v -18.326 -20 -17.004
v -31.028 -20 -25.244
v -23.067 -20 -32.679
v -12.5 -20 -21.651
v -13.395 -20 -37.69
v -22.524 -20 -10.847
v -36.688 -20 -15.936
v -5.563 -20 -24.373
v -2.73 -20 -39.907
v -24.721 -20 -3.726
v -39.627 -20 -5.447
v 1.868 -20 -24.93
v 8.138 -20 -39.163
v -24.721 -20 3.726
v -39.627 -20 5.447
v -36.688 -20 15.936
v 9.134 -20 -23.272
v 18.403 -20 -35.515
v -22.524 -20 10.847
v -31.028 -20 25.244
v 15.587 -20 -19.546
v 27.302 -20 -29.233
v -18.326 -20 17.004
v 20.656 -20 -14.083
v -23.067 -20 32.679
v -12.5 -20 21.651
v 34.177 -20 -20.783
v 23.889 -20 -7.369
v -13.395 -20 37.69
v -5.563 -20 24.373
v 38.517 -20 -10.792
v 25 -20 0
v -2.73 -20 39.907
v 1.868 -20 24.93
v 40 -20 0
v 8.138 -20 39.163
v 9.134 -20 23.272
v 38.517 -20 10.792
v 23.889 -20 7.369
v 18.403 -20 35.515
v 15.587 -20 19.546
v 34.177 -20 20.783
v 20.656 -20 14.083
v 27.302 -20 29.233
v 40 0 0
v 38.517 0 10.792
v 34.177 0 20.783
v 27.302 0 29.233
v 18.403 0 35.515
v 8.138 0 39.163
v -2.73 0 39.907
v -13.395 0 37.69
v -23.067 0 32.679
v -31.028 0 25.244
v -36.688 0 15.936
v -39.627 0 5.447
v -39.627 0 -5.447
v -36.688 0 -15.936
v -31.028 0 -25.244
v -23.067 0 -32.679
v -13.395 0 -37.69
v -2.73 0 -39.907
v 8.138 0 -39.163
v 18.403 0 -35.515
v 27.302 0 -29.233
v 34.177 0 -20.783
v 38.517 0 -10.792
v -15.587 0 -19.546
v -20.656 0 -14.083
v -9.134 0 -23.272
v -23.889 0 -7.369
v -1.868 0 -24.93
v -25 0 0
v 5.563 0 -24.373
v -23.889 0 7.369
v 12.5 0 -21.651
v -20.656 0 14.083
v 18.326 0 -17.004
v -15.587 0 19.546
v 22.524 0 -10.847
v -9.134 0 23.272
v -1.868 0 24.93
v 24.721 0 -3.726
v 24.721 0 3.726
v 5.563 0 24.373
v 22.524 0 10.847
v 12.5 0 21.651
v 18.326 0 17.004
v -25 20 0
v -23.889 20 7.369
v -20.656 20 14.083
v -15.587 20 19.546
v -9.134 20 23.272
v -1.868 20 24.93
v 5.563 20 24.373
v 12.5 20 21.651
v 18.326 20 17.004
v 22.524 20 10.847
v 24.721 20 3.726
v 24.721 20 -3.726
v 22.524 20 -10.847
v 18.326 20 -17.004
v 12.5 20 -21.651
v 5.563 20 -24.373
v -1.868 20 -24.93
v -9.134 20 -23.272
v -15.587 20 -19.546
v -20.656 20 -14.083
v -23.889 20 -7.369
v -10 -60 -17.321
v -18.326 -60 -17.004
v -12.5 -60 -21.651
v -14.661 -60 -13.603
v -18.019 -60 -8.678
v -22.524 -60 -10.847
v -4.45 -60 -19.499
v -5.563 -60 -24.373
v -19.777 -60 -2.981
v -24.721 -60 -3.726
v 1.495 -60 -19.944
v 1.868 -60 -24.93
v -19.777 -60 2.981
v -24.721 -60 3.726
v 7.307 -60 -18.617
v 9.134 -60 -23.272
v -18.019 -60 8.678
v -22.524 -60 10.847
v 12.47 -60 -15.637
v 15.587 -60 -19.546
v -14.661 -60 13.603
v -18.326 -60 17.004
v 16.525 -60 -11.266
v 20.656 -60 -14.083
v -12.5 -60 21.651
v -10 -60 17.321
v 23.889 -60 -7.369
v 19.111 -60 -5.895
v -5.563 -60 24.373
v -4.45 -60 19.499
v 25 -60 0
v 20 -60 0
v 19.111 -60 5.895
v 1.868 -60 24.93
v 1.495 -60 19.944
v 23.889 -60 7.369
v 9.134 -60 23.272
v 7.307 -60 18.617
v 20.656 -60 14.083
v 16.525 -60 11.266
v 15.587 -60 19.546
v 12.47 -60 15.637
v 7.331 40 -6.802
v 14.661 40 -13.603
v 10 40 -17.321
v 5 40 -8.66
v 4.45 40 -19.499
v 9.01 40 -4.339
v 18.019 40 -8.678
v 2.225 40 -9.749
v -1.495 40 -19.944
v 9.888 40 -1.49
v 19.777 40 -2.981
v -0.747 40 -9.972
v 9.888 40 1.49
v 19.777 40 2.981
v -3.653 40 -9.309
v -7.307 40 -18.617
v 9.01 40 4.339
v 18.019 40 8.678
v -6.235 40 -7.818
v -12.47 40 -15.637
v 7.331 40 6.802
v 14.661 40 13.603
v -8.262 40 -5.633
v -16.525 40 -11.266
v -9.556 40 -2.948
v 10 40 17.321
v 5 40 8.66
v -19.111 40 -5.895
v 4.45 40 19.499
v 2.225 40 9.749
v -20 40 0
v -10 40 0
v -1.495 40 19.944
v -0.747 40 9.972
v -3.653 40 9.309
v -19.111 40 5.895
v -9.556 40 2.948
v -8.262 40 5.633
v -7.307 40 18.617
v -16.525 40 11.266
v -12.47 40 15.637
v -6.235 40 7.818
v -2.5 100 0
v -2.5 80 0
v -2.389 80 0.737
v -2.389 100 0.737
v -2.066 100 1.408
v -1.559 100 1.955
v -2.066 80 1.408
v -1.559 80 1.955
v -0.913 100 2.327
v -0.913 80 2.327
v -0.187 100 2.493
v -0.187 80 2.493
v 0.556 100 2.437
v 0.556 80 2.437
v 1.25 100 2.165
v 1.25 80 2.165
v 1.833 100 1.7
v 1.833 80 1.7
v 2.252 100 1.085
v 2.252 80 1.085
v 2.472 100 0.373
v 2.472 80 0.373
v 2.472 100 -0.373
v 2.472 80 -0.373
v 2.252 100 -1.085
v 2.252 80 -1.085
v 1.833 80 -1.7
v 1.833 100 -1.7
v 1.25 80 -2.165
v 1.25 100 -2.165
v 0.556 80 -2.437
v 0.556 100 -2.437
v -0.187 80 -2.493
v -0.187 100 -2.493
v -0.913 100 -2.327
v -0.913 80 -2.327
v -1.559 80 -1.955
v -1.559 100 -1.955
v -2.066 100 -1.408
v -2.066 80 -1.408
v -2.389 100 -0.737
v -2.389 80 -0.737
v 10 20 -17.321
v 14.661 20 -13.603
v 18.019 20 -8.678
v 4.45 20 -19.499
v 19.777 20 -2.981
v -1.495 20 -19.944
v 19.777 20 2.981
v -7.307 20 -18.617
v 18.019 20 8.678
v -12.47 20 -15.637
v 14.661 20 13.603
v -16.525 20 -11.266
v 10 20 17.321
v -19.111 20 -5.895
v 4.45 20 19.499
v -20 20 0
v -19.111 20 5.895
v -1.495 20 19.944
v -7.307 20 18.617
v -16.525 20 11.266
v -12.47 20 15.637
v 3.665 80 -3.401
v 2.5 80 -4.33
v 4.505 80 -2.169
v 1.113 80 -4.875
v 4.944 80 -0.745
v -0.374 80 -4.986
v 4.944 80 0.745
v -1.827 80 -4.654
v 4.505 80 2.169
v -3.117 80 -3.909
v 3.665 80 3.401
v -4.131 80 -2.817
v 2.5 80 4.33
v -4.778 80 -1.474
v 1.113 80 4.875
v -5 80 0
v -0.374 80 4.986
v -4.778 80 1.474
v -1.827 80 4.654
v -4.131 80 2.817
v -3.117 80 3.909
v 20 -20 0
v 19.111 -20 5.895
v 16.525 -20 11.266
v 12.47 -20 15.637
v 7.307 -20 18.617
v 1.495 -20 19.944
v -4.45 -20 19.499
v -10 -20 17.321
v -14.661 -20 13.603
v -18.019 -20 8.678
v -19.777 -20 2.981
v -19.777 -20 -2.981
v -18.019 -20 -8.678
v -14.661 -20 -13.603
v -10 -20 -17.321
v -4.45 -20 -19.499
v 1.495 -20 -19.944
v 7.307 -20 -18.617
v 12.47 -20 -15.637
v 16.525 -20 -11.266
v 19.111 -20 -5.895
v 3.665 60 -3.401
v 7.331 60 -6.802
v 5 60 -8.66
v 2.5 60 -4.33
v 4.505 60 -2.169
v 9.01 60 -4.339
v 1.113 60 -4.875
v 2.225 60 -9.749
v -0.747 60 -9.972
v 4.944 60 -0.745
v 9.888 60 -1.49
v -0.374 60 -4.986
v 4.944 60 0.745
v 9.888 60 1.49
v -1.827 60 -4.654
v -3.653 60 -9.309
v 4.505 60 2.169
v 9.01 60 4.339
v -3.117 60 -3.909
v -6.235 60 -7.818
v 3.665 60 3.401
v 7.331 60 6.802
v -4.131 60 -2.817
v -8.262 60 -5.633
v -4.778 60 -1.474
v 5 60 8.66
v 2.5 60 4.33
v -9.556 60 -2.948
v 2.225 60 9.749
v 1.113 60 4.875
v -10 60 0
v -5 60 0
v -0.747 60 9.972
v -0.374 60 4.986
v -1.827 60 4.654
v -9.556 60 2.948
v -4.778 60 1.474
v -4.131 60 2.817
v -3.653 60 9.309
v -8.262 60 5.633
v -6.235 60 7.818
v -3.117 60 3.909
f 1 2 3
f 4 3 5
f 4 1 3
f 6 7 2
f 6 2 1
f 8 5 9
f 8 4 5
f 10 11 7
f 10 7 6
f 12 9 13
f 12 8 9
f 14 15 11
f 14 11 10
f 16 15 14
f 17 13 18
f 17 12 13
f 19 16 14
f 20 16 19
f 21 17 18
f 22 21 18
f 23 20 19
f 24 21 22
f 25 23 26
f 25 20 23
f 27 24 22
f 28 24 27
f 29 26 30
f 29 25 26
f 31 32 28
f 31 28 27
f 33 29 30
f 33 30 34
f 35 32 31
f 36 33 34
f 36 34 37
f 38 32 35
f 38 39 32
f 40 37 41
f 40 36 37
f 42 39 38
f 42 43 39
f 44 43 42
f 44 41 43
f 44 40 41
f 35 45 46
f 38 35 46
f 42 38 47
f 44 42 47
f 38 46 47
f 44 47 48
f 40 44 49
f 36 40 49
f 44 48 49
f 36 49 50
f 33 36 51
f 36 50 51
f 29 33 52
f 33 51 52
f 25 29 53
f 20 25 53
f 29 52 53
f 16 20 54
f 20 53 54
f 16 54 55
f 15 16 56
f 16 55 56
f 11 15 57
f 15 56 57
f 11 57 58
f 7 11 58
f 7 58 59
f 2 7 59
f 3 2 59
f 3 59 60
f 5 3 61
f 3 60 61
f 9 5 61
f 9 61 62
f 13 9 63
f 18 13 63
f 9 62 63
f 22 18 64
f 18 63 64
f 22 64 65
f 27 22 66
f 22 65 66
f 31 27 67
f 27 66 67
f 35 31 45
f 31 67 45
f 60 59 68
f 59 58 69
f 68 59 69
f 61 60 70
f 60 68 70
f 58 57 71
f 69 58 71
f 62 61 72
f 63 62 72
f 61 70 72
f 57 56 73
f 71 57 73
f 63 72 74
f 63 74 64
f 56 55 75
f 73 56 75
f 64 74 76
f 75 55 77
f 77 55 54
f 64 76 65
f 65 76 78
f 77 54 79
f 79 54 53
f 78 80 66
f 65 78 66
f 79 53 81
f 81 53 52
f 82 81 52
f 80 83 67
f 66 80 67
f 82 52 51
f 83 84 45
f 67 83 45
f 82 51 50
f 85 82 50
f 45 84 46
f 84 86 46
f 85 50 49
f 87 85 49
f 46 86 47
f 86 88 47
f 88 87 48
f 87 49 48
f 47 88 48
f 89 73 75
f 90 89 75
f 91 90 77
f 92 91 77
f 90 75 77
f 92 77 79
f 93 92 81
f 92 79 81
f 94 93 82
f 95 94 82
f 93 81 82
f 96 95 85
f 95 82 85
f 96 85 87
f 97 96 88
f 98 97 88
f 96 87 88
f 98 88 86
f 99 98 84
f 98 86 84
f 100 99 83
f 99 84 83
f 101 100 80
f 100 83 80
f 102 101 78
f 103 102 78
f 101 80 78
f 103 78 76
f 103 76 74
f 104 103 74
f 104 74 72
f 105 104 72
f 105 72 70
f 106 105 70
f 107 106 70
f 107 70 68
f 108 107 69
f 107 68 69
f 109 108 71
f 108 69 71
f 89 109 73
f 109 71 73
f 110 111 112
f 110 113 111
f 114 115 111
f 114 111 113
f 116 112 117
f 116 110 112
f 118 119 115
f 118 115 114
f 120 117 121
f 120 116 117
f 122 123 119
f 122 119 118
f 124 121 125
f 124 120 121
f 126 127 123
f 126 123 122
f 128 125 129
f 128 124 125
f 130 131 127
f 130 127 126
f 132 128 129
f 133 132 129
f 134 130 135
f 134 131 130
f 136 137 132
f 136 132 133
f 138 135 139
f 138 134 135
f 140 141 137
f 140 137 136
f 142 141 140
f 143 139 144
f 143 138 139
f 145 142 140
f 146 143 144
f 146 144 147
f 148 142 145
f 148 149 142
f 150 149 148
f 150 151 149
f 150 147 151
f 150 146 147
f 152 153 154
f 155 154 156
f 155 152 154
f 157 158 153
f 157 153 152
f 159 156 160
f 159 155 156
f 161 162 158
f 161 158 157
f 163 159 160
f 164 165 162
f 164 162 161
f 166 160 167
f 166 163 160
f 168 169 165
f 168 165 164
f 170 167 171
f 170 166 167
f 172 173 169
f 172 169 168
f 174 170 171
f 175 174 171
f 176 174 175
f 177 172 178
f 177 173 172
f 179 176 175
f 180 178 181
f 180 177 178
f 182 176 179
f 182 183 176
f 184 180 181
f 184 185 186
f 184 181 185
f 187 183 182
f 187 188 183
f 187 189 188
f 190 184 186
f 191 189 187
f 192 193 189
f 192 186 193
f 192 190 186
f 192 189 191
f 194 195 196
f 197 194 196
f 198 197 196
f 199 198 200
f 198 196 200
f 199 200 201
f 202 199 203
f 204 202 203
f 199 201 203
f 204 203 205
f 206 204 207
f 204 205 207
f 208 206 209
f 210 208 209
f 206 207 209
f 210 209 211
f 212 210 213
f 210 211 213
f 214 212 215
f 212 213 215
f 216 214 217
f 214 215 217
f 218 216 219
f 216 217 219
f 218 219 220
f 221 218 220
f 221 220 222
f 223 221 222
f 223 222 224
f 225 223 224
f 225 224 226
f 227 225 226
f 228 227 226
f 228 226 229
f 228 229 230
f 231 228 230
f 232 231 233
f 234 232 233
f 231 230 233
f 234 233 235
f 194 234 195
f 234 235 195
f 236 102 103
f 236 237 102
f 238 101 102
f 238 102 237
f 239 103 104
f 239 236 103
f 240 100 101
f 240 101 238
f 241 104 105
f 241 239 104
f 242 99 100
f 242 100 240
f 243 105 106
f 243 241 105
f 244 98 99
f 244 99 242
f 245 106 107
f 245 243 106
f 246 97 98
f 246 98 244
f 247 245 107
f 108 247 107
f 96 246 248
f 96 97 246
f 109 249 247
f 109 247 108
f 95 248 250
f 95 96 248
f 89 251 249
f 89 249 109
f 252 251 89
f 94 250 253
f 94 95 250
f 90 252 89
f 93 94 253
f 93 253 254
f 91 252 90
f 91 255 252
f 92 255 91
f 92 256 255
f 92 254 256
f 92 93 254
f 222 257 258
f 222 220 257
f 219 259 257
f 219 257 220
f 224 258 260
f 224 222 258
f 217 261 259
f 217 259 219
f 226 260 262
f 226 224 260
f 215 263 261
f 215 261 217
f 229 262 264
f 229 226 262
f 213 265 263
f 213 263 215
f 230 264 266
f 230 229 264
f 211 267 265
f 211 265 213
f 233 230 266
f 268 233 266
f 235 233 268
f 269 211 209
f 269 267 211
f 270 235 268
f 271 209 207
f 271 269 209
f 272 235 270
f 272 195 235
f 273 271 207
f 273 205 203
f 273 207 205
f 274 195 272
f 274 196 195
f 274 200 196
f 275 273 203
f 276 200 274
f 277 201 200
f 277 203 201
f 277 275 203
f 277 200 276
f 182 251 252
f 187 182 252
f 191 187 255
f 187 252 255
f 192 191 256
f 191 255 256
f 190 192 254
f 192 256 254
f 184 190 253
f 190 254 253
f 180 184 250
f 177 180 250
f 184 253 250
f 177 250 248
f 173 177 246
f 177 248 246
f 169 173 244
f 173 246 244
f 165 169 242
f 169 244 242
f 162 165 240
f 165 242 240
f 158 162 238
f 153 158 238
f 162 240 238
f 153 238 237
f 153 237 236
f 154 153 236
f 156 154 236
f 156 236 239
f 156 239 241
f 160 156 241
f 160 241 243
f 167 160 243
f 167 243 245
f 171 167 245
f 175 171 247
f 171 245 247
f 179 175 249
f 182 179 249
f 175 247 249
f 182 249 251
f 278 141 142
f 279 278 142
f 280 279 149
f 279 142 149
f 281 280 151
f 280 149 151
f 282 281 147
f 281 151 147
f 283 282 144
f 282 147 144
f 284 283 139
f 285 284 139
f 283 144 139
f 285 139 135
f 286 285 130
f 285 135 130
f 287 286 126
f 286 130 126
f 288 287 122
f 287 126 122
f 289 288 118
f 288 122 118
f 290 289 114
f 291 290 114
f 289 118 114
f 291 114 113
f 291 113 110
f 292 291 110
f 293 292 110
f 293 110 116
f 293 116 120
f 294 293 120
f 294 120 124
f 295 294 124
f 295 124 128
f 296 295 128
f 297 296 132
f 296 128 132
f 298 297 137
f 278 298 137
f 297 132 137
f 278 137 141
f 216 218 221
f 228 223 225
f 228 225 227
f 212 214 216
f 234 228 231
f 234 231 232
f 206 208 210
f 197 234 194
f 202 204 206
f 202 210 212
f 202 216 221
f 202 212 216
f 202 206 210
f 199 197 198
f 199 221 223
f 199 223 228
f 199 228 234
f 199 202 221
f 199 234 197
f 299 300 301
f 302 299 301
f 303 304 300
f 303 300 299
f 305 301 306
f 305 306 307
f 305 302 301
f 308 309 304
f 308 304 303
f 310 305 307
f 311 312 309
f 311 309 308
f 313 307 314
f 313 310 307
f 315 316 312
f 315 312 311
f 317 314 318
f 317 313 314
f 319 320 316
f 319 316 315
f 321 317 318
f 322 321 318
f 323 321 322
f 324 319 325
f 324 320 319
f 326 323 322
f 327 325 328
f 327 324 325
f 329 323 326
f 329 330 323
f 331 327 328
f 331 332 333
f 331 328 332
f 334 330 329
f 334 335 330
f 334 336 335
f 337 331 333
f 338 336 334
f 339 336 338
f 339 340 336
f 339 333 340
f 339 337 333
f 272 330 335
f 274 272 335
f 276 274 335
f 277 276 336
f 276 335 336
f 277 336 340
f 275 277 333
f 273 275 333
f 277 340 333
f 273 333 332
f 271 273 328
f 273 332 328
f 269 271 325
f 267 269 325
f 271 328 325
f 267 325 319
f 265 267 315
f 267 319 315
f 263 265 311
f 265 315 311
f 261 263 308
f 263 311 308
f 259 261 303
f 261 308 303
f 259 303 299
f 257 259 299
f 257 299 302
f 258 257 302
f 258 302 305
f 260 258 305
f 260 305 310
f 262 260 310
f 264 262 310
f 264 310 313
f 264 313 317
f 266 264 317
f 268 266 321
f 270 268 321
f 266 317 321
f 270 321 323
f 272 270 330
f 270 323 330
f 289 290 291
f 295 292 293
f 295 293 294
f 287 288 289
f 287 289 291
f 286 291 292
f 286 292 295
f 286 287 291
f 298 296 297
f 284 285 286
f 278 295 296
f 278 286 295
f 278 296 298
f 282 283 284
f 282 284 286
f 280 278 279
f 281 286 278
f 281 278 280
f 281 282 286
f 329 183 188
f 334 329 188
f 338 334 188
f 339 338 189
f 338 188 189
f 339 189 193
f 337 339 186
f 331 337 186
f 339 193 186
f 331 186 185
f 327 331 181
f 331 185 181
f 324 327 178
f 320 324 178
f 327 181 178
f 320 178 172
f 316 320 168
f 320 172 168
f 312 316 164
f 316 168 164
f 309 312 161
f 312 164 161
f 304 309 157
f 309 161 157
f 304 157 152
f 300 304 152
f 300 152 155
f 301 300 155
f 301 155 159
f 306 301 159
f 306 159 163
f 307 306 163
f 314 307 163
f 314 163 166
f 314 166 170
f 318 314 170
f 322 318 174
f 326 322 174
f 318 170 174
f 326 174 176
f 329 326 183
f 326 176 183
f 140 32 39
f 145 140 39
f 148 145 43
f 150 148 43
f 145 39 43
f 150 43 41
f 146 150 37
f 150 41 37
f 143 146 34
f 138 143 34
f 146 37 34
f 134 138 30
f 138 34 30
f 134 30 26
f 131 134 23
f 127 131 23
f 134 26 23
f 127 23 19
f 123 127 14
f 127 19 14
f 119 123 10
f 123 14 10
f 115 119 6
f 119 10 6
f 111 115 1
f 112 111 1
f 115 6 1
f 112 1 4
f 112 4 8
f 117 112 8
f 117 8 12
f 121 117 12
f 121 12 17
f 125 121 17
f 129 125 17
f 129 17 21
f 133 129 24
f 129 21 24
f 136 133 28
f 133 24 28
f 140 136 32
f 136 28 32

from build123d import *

# Parameters (mm, degrees)
F0_R      = 40
F1_DEPTH  = 20
F2_R      = 25
F3_DEPTH  = 40
F4_R      = 20
F5_DEPTH  = 40
F6_R      = 25
F7_DEPTH  = 20
F8_R      = 20
F9_DEPTH  = 20
F11_R     = 10
F12_DEPTH = 20
F13_R     = 5
F14_DEPTH = 20
F15_R     = 2.5
F16_DEPTH = 20


with BuildPart() as f1:
    # F0 (on Front) → F1 (new body)
    with BuildSketch(Plane.XZ):
        Circle(F0_R)
    extrude(amount=F1_DEPTH)

    # F2 (on face) → F3 (join)
    with BuildSketch(Plane.XZ.offset(20)):
        Circle(F2_R)
    extrude(amount=F3_DEPTH)

    # F4 (on face) → F5 (cut)
    with BuildSketch(Plane.XZ.offset(60)):
        Circle(F4_R)
    extrude(amount=-F5_DEPTH, mode=Mode.SUBTRACT)

    # F6 (on face) → F7 (join)
    with BuildSketch(Plane(origin=(0, 0, 0), x_dir=(-1, 0, 0), z_dir=(0, 1, 0))):
        Circle(F6_R)
    extrude(amount=F7_DEPTH)

    # F8 (on face) → F9 (join)
    with BuildSketch(Plane(origin=(0, 20, 0), x_dir=(-1, 0, 0), z_dir=(0, 1, 0))):
        Circle(F8_R)
    extrude(amount=F9_DEPTH)

    # F11 (on face) → F12 (join)
    with BuildSketch(Plane(origin=(0, 40, 0), x_dir=(-1, 0, 0), z_dir=(0, 1, 0))):
        Circle(F11_R)
    extrude(amount=F12_DEPTH)

    # F13 (on face) → F14 (join)
    with BuildSketch(Plane(origin=(0, 60, 0), x_dir=(-1, 0, 0), z_dir=(0, 1, 0))):
        Circle(F13_R)
    extrude(amount=F14_DEPTH)

    # F15 (on face) → F16 (join)
    with BuildSketch(Plane(origin=(0, 80, 0), x_dir=(-1, 0, 0), z_dir=(0, 1, 0))):
        Circle(F15_R)
    extrude(amount=F16_DEPTH)


solid = f1.part
